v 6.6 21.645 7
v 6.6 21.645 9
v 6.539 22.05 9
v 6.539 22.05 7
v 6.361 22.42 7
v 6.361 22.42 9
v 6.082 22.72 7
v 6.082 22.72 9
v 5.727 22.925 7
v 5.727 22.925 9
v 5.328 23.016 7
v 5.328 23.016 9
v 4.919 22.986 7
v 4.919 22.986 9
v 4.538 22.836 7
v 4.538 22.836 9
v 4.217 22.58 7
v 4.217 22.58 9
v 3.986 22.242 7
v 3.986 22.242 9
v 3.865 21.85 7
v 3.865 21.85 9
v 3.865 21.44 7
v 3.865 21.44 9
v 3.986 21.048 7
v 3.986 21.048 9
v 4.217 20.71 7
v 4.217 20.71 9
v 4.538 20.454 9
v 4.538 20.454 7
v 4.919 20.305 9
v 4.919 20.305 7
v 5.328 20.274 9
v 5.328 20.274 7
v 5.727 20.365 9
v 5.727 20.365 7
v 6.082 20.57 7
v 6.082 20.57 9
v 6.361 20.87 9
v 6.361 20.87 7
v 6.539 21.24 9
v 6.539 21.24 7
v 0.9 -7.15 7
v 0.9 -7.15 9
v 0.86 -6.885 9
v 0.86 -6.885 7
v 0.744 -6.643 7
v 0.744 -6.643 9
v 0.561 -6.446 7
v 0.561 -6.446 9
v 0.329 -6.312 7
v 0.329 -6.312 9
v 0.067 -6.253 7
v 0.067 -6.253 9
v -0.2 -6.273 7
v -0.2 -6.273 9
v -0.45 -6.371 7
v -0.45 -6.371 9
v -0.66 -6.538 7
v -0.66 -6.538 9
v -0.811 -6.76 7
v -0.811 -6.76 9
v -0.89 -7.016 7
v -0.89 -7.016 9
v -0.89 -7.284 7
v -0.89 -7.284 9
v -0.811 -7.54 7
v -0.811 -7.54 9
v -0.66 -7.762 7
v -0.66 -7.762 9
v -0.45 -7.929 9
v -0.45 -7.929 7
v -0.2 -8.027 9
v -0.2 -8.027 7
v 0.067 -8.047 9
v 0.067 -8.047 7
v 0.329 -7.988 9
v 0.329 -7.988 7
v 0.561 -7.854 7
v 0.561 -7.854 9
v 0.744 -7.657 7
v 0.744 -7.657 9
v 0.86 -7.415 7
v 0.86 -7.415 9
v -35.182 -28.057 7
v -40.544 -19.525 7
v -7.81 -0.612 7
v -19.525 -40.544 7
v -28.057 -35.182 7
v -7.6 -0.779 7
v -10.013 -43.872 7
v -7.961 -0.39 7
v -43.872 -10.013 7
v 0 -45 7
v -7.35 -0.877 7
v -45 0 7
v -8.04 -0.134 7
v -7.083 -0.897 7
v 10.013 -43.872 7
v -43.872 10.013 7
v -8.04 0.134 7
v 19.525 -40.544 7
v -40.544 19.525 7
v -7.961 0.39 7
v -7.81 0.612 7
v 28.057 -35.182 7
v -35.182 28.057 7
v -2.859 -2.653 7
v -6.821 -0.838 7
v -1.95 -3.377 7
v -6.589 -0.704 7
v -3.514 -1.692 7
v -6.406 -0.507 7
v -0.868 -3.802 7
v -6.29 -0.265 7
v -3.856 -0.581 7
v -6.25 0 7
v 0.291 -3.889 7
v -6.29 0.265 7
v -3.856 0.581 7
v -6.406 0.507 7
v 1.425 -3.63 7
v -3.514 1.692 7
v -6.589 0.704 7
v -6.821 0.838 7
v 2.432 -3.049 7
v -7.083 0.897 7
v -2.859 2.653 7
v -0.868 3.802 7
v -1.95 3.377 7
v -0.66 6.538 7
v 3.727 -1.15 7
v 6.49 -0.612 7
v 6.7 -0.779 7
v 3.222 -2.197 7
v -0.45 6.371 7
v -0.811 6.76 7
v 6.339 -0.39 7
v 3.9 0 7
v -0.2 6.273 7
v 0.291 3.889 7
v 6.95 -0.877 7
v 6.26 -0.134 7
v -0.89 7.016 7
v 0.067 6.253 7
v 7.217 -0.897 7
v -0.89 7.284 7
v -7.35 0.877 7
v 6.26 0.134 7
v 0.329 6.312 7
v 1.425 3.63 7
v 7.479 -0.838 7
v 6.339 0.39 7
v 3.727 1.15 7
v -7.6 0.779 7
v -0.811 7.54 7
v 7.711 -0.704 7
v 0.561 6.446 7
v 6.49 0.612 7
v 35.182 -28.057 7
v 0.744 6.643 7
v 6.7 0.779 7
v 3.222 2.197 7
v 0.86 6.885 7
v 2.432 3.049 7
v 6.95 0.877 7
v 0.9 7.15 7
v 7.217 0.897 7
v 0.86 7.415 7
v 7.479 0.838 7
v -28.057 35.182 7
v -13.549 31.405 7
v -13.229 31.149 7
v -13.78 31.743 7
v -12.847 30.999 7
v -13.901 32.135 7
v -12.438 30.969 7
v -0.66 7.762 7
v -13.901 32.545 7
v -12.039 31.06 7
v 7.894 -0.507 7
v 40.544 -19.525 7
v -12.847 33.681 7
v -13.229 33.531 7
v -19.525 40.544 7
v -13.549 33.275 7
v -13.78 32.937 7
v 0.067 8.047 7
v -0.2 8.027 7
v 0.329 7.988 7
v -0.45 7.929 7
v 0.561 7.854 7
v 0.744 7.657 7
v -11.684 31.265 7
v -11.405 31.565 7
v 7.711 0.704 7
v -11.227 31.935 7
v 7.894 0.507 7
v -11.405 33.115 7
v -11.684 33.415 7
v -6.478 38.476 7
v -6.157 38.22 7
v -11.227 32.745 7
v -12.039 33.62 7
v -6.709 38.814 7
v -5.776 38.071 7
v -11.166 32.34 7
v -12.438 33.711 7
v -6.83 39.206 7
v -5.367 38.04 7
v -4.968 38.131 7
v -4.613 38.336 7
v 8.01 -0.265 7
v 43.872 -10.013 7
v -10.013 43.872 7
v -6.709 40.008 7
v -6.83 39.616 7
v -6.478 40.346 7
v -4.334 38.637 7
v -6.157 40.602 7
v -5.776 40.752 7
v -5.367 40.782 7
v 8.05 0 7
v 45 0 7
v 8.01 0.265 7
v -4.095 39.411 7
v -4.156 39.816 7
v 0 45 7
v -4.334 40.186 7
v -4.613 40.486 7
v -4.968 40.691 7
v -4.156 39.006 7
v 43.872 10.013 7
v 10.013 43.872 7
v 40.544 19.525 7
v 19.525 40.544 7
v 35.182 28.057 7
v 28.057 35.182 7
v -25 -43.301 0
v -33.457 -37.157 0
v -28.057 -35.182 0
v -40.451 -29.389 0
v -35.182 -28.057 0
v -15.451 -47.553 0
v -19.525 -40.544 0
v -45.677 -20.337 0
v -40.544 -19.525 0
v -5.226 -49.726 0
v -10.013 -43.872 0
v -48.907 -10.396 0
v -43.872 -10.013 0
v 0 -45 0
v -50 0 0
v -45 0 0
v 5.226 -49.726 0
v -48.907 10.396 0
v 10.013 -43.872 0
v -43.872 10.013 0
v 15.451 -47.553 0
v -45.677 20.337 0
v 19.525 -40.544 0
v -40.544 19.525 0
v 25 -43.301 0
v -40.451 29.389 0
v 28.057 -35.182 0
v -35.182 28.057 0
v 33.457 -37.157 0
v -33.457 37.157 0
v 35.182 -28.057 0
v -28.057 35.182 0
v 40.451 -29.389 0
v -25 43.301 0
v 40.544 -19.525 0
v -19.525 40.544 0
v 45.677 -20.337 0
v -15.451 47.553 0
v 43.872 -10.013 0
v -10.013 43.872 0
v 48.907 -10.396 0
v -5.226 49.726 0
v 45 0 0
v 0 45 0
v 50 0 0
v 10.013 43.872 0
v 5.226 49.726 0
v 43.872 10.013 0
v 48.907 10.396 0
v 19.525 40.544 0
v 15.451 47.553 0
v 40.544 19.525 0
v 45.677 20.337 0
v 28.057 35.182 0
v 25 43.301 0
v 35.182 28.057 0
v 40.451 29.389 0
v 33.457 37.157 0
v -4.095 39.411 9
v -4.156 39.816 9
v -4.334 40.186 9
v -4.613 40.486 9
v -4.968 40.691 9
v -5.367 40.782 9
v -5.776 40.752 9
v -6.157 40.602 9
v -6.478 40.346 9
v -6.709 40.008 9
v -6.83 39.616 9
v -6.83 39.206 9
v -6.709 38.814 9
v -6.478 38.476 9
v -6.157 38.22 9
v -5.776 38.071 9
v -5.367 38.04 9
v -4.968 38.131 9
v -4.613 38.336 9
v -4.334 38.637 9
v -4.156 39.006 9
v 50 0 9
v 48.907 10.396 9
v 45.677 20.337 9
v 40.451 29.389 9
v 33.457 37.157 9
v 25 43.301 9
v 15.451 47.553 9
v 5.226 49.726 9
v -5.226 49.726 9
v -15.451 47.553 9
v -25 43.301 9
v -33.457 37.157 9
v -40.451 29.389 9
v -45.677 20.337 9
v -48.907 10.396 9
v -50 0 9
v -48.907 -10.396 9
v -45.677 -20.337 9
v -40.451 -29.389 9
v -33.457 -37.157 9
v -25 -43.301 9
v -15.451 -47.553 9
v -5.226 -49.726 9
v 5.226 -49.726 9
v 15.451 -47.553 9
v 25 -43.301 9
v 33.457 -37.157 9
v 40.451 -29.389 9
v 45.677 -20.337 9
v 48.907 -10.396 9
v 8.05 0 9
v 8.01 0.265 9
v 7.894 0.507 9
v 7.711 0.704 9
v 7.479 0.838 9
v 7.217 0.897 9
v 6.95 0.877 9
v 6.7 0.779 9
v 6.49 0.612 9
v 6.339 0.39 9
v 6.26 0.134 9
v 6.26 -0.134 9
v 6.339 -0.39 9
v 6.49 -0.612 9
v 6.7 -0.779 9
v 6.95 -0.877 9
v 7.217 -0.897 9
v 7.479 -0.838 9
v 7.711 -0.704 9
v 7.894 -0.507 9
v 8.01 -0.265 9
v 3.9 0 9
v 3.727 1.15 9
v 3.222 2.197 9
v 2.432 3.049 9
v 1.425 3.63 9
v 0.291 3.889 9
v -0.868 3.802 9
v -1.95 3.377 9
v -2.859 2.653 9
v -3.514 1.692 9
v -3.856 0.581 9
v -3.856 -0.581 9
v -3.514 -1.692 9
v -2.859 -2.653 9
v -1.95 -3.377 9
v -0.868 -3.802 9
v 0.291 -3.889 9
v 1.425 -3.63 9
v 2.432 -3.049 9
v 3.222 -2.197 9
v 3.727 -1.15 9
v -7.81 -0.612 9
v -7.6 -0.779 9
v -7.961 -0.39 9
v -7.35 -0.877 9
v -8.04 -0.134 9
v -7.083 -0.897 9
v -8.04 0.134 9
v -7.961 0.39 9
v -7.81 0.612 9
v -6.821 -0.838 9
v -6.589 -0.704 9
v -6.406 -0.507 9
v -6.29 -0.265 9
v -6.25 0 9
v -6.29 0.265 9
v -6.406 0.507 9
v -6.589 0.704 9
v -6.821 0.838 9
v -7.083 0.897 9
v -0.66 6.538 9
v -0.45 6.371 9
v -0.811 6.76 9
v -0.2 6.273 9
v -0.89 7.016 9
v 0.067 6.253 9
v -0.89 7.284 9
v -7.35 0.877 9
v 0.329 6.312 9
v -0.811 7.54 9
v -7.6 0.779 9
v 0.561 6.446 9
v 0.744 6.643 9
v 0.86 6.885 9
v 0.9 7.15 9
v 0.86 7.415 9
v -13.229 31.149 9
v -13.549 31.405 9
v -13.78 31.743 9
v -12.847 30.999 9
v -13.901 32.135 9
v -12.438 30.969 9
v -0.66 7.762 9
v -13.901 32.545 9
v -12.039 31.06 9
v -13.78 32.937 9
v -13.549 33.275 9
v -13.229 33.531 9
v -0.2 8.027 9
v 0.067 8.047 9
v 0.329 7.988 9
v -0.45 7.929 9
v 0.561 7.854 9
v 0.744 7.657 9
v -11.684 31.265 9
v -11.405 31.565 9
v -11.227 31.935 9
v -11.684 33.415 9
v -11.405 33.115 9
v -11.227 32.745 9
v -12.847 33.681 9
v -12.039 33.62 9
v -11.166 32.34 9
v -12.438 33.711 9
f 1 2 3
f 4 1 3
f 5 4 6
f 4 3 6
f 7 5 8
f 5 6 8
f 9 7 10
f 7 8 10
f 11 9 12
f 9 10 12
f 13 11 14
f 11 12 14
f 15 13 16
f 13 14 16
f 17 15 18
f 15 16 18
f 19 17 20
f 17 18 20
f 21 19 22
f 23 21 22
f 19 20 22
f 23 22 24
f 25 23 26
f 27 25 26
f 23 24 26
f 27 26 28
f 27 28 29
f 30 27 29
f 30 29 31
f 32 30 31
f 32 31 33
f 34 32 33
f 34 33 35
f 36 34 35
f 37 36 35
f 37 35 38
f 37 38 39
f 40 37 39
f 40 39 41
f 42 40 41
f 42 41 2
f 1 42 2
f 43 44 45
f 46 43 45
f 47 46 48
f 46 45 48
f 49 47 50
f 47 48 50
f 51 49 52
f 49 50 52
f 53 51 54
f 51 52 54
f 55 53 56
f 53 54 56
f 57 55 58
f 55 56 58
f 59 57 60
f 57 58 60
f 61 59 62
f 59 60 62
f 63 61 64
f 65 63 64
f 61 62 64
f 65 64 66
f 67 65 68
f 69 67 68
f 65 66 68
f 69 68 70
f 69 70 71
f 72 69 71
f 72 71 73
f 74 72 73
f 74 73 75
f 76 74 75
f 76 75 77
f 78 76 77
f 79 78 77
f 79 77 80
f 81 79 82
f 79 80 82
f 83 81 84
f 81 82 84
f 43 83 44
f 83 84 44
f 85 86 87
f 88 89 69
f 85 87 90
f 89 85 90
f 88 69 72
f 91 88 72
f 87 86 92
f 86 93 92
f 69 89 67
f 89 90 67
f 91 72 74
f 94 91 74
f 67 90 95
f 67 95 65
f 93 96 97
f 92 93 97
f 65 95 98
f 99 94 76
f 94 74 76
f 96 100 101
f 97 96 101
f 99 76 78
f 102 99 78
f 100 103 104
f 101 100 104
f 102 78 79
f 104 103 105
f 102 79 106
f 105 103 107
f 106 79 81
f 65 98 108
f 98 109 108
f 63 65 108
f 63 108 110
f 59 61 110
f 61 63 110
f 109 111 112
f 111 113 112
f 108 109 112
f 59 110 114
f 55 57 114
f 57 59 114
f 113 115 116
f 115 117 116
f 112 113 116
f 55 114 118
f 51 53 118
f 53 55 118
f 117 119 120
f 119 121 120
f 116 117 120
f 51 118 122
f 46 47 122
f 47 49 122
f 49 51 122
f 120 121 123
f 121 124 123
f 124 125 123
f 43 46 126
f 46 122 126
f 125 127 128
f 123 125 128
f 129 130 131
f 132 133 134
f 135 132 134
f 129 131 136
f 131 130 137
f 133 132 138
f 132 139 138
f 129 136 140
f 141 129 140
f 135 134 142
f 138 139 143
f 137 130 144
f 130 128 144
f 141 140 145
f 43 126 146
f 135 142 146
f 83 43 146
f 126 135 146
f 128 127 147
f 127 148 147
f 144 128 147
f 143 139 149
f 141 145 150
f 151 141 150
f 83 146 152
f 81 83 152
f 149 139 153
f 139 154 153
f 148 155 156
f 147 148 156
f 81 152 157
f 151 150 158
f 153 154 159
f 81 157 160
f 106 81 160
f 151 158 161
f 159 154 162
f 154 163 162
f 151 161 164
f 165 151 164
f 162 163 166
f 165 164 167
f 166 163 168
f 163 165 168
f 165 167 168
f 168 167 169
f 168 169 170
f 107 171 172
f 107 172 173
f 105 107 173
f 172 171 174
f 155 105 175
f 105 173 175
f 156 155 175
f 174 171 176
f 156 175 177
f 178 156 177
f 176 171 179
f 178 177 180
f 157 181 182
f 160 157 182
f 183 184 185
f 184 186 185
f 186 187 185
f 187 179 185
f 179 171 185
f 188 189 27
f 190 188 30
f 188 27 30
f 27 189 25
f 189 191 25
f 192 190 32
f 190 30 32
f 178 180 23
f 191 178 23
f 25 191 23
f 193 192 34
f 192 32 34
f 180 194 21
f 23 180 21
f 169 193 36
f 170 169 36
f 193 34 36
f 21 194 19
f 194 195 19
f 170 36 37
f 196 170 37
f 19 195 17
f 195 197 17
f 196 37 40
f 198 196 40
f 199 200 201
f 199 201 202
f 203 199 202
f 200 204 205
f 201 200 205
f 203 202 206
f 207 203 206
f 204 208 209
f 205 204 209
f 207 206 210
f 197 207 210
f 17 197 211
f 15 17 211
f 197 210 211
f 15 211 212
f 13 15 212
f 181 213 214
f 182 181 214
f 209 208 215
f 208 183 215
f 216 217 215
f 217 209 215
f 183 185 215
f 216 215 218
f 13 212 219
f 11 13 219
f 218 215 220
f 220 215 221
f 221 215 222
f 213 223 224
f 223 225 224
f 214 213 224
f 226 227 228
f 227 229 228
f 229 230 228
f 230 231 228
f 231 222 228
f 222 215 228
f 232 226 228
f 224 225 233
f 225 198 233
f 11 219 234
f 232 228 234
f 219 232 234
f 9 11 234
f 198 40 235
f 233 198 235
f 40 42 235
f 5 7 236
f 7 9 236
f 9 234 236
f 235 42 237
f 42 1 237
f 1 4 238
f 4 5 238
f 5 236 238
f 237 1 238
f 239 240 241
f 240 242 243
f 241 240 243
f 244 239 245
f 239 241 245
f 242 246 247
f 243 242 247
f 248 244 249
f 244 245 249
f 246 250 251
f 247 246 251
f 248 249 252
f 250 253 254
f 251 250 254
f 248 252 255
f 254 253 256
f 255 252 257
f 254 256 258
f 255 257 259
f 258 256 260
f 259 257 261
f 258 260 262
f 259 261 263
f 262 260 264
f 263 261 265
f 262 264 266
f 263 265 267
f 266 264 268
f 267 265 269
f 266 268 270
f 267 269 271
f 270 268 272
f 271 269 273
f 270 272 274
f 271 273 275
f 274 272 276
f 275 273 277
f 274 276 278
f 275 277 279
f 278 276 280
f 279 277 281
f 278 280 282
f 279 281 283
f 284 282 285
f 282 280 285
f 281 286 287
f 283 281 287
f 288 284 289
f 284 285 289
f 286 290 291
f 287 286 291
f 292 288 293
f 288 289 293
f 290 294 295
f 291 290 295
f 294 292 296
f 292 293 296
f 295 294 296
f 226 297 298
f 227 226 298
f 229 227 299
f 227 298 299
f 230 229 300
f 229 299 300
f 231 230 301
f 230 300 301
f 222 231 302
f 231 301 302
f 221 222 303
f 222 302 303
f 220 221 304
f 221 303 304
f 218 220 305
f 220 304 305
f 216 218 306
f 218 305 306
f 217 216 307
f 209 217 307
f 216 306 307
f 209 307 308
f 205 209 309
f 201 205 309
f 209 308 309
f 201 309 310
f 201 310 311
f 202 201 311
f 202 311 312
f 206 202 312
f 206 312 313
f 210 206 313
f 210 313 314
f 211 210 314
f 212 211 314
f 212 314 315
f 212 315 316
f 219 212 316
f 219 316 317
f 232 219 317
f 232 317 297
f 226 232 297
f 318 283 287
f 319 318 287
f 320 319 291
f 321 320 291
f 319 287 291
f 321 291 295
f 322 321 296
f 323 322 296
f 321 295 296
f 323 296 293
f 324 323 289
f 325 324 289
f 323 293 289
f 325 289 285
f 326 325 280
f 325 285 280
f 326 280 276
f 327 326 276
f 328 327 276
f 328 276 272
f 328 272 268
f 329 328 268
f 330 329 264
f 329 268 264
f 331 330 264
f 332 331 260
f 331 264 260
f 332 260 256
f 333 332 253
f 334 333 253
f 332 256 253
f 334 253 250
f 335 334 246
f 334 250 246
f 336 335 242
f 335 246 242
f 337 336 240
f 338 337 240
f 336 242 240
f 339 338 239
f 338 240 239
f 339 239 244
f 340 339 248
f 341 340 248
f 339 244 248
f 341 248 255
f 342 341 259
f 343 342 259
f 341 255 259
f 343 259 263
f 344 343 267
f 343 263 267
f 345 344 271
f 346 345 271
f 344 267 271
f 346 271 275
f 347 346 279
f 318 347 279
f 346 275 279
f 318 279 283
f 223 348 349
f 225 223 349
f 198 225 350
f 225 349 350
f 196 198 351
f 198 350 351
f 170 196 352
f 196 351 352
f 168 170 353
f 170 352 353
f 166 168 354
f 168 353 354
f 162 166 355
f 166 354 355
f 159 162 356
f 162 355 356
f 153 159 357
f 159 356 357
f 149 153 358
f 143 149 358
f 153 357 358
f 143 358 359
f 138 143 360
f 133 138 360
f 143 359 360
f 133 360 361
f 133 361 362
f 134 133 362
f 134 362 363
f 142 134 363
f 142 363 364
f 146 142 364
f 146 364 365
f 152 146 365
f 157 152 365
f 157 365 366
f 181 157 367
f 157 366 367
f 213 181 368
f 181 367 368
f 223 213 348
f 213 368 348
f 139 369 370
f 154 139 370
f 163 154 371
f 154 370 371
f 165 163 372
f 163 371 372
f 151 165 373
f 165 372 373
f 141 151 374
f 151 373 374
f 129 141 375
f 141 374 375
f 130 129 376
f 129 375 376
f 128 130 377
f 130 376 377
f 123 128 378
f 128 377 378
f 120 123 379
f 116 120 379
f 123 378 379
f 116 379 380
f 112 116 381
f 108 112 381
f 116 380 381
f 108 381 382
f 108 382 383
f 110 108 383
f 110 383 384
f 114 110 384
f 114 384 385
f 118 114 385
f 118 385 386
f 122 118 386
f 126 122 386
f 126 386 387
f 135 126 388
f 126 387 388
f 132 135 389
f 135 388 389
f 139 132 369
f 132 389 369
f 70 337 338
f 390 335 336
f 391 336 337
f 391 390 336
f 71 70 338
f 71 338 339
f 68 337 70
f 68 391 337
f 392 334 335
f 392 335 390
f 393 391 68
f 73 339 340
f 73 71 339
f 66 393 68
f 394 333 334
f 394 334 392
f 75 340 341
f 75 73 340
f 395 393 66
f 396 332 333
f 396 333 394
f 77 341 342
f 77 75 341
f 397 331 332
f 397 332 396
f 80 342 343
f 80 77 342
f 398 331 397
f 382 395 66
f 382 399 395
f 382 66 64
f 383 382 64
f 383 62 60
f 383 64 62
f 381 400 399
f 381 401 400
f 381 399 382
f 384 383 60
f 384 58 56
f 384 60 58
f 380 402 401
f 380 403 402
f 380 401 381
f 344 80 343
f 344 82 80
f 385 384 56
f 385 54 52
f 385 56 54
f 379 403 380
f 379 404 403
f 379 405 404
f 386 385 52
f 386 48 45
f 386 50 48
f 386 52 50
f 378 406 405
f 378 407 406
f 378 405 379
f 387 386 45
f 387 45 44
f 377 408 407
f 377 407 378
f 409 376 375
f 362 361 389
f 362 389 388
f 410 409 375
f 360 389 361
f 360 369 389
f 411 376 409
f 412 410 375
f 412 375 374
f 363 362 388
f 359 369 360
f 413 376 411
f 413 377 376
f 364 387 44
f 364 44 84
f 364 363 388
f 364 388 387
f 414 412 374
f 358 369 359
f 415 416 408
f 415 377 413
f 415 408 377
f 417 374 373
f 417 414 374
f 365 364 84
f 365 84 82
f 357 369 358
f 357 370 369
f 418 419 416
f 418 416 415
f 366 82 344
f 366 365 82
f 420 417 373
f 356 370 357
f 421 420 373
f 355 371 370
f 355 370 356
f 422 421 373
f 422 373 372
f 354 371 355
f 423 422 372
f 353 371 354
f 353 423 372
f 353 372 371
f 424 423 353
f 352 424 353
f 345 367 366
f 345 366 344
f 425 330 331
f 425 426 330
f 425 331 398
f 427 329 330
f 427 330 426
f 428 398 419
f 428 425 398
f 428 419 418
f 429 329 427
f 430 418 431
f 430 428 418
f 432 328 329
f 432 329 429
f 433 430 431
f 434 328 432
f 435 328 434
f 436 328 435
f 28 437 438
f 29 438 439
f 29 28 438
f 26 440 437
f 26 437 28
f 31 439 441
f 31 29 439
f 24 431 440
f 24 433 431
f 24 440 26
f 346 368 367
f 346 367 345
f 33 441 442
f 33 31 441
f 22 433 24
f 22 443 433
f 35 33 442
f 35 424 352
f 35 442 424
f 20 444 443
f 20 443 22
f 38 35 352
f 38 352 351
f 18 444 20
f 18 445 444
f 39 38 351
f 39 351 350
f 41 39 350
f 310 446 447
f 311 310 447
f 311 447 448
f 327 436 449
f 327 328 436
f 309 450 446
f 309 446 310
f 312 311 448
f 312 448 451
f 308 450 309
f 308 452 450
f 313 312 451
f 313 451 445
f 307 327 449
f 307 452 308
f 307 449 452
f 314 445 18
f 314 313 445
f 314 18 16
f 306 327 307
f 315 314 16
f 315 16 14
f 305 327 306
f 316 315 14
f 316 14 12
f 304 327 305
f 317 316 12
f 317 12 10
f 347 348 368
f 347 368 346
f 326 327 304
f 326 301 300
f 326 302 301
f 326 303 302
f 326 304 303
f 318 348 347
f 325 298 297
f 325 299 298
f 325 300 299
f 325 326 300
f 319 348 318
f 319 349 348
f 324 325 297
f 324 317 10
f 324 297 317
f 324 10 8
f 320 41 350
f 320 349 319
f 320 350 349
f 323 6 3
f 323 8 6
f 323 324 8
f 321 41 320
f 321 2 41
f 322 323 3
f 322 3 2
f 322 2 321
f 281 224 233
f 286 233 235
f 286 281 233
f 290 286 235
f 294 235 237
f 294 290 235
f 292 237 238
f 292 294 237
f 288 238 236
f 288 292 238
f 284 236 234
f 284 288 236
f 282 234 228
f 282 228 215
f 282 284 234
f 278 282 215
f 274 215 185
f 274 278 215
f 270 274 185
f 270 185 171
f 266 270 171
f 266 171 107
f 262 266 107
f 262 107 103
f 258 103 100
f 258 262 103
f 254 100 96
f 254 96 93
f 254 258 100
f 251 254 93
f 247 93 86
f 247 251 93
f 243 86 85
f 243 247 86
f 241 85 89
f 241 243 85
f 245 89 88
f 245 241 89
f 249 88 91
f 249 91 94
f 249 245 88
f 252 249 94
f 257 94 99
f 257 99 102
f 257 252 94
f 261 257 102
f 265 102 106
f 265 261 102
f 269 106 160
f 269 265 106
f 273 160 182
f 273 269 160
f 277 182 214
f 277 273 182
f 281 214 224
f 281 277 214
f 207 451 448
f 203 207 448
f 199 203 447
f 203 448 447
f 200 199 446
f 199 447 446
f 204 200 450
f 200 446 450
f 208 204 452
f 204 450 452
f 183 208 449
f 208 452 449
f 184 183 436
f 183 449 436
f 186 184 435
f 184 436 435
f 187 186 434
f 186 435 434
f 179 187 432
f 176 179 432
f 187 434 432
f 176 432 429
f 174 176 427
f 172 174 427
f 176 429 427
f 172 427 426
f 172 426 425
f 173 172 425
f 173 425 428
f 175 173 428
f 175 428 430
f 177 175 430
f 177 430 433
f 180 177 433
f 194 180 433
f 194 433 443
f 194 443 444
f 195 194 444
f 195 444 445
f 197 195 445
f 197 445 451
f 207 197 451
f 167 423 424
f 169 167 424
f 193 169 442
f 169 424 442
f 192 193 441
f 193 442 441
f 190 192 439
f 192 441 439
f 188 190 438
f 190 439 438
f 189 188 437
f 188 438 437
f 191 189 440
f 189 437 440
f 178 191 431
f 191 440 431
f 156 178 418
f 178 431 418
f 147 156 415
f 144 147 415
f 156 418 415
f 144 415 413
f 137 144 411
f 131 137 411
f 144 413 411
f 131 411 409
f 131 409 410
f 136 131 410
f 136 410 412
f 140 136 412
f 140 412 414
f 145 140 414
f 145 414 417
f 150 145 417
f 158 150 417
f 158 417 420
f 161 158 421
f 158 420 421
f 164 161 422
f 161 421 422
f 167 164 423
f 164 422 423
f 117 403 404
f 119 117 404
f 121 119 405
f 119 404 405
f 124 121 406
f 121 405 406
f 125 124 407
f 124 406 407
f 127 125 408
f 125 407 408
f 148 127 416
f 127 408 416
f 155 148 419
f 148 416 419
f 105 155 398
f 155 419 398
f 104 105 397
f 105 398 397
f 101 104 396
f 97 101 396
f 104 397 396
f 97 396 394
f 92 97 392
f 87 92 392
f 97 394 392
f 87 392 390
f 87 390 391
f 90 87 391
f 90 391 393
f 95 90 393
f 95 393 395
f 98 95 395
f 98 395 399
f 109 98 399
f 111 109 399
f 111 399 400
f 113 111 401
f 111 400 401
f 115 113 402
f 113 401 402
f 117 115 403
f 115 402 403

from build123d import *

# Parameters (mm, degrees)
SKETCH003_R       = 1.375
EXTRUDE004_DEPTH  = 10
SKETCH001_R       = 0.9
EXTRUDE_DEPTH     = 2
SKETCH_R          = 3.9
EXTRUDE001_DEPTH  = 2
CYLINDER001_R     = 45
CYLINDER001_DEPTH = 7
CYLINDER_R        = 50
CYLINDER_DEPTH    = 9


with BuildPart() as extrude004:
    # Sketch003 (on Face6 of Extrude002) → Extrude004 (new body)
    with BuildSketch(Plane.XY.offset(14)):
        with Locations((-12.541029, 32.340019)):
            Circle(SKETCH003_R)
        with Locations((-5.469961, 39.411087)):
            Circle(SKETCH003_R)
        with Locations((5.225029, 21.645029)):
            Circle(SKETCH003_R)
    extrude(amount=-EXTRUDE004_DEPTH)


with BuildPart() as screwholes_middle_outer:
    # Sketch001 (on Face3 of Cut001) → Extrude (new body)
    with BuildSketch(Plane.XY.offset(9)):
        with Locations((0, 7.15)):
            Circle(SKETCH001_R)
        with Locations((-7.15, 0)):
            Circle(SKETCH001_R)
        with Locations((0, -7.15)):
            Circle(SKETCH001_R)
        with Locations((7.15, 0)):
            Circle(SKETCH001_R)
    extrude(amount=-EXTRUDE_DEPTH)


with BuildPart() as screwholes_middle_inner:
    # Sketch (on Face3 of Cut) → Extrude001 (new body)
    with BuildSketch(Plane.XY.offset(9)):
        Circle(SKETCH_R)
    extrude(amount=-EXTRUDE001_DEPTH)


with BuildPart() as cylinder001:
    # Cylinder001 → Cylinder001 (new body)
    with BuildSketch(Plane.XY):
        Circle(CYLINDER001_R)
    extrude(amount=CYLINDER001_DEPTH)


with BuildPart() as platform_shoulder_screws:
    # Cylinder → Cylinder (new body)
    with BuildSketch(Plane.XY):
        Circle(CYLINDER_R)
    extrude(amount=CYLINDER_DEPTH)

    # Cut: cut Cylinder001
    add(cylinder001.part, mode=Mode.SUBTRACT)

    # Cut001: cut Screwholes-middle-inner
    add(screwholes_middle_inner.part, mode=Mode.SUBTRACT)

    # Cut002: cut Screwholes-middle-outer
    add(screwholes_middle_outer.part, mode=Mode.SUBTRACT)

    # Cut003: cut Extrude004
    add(extrude004.part, mode=Mode.SUBTRACT)


solid = platform_shoulder_screws.part
